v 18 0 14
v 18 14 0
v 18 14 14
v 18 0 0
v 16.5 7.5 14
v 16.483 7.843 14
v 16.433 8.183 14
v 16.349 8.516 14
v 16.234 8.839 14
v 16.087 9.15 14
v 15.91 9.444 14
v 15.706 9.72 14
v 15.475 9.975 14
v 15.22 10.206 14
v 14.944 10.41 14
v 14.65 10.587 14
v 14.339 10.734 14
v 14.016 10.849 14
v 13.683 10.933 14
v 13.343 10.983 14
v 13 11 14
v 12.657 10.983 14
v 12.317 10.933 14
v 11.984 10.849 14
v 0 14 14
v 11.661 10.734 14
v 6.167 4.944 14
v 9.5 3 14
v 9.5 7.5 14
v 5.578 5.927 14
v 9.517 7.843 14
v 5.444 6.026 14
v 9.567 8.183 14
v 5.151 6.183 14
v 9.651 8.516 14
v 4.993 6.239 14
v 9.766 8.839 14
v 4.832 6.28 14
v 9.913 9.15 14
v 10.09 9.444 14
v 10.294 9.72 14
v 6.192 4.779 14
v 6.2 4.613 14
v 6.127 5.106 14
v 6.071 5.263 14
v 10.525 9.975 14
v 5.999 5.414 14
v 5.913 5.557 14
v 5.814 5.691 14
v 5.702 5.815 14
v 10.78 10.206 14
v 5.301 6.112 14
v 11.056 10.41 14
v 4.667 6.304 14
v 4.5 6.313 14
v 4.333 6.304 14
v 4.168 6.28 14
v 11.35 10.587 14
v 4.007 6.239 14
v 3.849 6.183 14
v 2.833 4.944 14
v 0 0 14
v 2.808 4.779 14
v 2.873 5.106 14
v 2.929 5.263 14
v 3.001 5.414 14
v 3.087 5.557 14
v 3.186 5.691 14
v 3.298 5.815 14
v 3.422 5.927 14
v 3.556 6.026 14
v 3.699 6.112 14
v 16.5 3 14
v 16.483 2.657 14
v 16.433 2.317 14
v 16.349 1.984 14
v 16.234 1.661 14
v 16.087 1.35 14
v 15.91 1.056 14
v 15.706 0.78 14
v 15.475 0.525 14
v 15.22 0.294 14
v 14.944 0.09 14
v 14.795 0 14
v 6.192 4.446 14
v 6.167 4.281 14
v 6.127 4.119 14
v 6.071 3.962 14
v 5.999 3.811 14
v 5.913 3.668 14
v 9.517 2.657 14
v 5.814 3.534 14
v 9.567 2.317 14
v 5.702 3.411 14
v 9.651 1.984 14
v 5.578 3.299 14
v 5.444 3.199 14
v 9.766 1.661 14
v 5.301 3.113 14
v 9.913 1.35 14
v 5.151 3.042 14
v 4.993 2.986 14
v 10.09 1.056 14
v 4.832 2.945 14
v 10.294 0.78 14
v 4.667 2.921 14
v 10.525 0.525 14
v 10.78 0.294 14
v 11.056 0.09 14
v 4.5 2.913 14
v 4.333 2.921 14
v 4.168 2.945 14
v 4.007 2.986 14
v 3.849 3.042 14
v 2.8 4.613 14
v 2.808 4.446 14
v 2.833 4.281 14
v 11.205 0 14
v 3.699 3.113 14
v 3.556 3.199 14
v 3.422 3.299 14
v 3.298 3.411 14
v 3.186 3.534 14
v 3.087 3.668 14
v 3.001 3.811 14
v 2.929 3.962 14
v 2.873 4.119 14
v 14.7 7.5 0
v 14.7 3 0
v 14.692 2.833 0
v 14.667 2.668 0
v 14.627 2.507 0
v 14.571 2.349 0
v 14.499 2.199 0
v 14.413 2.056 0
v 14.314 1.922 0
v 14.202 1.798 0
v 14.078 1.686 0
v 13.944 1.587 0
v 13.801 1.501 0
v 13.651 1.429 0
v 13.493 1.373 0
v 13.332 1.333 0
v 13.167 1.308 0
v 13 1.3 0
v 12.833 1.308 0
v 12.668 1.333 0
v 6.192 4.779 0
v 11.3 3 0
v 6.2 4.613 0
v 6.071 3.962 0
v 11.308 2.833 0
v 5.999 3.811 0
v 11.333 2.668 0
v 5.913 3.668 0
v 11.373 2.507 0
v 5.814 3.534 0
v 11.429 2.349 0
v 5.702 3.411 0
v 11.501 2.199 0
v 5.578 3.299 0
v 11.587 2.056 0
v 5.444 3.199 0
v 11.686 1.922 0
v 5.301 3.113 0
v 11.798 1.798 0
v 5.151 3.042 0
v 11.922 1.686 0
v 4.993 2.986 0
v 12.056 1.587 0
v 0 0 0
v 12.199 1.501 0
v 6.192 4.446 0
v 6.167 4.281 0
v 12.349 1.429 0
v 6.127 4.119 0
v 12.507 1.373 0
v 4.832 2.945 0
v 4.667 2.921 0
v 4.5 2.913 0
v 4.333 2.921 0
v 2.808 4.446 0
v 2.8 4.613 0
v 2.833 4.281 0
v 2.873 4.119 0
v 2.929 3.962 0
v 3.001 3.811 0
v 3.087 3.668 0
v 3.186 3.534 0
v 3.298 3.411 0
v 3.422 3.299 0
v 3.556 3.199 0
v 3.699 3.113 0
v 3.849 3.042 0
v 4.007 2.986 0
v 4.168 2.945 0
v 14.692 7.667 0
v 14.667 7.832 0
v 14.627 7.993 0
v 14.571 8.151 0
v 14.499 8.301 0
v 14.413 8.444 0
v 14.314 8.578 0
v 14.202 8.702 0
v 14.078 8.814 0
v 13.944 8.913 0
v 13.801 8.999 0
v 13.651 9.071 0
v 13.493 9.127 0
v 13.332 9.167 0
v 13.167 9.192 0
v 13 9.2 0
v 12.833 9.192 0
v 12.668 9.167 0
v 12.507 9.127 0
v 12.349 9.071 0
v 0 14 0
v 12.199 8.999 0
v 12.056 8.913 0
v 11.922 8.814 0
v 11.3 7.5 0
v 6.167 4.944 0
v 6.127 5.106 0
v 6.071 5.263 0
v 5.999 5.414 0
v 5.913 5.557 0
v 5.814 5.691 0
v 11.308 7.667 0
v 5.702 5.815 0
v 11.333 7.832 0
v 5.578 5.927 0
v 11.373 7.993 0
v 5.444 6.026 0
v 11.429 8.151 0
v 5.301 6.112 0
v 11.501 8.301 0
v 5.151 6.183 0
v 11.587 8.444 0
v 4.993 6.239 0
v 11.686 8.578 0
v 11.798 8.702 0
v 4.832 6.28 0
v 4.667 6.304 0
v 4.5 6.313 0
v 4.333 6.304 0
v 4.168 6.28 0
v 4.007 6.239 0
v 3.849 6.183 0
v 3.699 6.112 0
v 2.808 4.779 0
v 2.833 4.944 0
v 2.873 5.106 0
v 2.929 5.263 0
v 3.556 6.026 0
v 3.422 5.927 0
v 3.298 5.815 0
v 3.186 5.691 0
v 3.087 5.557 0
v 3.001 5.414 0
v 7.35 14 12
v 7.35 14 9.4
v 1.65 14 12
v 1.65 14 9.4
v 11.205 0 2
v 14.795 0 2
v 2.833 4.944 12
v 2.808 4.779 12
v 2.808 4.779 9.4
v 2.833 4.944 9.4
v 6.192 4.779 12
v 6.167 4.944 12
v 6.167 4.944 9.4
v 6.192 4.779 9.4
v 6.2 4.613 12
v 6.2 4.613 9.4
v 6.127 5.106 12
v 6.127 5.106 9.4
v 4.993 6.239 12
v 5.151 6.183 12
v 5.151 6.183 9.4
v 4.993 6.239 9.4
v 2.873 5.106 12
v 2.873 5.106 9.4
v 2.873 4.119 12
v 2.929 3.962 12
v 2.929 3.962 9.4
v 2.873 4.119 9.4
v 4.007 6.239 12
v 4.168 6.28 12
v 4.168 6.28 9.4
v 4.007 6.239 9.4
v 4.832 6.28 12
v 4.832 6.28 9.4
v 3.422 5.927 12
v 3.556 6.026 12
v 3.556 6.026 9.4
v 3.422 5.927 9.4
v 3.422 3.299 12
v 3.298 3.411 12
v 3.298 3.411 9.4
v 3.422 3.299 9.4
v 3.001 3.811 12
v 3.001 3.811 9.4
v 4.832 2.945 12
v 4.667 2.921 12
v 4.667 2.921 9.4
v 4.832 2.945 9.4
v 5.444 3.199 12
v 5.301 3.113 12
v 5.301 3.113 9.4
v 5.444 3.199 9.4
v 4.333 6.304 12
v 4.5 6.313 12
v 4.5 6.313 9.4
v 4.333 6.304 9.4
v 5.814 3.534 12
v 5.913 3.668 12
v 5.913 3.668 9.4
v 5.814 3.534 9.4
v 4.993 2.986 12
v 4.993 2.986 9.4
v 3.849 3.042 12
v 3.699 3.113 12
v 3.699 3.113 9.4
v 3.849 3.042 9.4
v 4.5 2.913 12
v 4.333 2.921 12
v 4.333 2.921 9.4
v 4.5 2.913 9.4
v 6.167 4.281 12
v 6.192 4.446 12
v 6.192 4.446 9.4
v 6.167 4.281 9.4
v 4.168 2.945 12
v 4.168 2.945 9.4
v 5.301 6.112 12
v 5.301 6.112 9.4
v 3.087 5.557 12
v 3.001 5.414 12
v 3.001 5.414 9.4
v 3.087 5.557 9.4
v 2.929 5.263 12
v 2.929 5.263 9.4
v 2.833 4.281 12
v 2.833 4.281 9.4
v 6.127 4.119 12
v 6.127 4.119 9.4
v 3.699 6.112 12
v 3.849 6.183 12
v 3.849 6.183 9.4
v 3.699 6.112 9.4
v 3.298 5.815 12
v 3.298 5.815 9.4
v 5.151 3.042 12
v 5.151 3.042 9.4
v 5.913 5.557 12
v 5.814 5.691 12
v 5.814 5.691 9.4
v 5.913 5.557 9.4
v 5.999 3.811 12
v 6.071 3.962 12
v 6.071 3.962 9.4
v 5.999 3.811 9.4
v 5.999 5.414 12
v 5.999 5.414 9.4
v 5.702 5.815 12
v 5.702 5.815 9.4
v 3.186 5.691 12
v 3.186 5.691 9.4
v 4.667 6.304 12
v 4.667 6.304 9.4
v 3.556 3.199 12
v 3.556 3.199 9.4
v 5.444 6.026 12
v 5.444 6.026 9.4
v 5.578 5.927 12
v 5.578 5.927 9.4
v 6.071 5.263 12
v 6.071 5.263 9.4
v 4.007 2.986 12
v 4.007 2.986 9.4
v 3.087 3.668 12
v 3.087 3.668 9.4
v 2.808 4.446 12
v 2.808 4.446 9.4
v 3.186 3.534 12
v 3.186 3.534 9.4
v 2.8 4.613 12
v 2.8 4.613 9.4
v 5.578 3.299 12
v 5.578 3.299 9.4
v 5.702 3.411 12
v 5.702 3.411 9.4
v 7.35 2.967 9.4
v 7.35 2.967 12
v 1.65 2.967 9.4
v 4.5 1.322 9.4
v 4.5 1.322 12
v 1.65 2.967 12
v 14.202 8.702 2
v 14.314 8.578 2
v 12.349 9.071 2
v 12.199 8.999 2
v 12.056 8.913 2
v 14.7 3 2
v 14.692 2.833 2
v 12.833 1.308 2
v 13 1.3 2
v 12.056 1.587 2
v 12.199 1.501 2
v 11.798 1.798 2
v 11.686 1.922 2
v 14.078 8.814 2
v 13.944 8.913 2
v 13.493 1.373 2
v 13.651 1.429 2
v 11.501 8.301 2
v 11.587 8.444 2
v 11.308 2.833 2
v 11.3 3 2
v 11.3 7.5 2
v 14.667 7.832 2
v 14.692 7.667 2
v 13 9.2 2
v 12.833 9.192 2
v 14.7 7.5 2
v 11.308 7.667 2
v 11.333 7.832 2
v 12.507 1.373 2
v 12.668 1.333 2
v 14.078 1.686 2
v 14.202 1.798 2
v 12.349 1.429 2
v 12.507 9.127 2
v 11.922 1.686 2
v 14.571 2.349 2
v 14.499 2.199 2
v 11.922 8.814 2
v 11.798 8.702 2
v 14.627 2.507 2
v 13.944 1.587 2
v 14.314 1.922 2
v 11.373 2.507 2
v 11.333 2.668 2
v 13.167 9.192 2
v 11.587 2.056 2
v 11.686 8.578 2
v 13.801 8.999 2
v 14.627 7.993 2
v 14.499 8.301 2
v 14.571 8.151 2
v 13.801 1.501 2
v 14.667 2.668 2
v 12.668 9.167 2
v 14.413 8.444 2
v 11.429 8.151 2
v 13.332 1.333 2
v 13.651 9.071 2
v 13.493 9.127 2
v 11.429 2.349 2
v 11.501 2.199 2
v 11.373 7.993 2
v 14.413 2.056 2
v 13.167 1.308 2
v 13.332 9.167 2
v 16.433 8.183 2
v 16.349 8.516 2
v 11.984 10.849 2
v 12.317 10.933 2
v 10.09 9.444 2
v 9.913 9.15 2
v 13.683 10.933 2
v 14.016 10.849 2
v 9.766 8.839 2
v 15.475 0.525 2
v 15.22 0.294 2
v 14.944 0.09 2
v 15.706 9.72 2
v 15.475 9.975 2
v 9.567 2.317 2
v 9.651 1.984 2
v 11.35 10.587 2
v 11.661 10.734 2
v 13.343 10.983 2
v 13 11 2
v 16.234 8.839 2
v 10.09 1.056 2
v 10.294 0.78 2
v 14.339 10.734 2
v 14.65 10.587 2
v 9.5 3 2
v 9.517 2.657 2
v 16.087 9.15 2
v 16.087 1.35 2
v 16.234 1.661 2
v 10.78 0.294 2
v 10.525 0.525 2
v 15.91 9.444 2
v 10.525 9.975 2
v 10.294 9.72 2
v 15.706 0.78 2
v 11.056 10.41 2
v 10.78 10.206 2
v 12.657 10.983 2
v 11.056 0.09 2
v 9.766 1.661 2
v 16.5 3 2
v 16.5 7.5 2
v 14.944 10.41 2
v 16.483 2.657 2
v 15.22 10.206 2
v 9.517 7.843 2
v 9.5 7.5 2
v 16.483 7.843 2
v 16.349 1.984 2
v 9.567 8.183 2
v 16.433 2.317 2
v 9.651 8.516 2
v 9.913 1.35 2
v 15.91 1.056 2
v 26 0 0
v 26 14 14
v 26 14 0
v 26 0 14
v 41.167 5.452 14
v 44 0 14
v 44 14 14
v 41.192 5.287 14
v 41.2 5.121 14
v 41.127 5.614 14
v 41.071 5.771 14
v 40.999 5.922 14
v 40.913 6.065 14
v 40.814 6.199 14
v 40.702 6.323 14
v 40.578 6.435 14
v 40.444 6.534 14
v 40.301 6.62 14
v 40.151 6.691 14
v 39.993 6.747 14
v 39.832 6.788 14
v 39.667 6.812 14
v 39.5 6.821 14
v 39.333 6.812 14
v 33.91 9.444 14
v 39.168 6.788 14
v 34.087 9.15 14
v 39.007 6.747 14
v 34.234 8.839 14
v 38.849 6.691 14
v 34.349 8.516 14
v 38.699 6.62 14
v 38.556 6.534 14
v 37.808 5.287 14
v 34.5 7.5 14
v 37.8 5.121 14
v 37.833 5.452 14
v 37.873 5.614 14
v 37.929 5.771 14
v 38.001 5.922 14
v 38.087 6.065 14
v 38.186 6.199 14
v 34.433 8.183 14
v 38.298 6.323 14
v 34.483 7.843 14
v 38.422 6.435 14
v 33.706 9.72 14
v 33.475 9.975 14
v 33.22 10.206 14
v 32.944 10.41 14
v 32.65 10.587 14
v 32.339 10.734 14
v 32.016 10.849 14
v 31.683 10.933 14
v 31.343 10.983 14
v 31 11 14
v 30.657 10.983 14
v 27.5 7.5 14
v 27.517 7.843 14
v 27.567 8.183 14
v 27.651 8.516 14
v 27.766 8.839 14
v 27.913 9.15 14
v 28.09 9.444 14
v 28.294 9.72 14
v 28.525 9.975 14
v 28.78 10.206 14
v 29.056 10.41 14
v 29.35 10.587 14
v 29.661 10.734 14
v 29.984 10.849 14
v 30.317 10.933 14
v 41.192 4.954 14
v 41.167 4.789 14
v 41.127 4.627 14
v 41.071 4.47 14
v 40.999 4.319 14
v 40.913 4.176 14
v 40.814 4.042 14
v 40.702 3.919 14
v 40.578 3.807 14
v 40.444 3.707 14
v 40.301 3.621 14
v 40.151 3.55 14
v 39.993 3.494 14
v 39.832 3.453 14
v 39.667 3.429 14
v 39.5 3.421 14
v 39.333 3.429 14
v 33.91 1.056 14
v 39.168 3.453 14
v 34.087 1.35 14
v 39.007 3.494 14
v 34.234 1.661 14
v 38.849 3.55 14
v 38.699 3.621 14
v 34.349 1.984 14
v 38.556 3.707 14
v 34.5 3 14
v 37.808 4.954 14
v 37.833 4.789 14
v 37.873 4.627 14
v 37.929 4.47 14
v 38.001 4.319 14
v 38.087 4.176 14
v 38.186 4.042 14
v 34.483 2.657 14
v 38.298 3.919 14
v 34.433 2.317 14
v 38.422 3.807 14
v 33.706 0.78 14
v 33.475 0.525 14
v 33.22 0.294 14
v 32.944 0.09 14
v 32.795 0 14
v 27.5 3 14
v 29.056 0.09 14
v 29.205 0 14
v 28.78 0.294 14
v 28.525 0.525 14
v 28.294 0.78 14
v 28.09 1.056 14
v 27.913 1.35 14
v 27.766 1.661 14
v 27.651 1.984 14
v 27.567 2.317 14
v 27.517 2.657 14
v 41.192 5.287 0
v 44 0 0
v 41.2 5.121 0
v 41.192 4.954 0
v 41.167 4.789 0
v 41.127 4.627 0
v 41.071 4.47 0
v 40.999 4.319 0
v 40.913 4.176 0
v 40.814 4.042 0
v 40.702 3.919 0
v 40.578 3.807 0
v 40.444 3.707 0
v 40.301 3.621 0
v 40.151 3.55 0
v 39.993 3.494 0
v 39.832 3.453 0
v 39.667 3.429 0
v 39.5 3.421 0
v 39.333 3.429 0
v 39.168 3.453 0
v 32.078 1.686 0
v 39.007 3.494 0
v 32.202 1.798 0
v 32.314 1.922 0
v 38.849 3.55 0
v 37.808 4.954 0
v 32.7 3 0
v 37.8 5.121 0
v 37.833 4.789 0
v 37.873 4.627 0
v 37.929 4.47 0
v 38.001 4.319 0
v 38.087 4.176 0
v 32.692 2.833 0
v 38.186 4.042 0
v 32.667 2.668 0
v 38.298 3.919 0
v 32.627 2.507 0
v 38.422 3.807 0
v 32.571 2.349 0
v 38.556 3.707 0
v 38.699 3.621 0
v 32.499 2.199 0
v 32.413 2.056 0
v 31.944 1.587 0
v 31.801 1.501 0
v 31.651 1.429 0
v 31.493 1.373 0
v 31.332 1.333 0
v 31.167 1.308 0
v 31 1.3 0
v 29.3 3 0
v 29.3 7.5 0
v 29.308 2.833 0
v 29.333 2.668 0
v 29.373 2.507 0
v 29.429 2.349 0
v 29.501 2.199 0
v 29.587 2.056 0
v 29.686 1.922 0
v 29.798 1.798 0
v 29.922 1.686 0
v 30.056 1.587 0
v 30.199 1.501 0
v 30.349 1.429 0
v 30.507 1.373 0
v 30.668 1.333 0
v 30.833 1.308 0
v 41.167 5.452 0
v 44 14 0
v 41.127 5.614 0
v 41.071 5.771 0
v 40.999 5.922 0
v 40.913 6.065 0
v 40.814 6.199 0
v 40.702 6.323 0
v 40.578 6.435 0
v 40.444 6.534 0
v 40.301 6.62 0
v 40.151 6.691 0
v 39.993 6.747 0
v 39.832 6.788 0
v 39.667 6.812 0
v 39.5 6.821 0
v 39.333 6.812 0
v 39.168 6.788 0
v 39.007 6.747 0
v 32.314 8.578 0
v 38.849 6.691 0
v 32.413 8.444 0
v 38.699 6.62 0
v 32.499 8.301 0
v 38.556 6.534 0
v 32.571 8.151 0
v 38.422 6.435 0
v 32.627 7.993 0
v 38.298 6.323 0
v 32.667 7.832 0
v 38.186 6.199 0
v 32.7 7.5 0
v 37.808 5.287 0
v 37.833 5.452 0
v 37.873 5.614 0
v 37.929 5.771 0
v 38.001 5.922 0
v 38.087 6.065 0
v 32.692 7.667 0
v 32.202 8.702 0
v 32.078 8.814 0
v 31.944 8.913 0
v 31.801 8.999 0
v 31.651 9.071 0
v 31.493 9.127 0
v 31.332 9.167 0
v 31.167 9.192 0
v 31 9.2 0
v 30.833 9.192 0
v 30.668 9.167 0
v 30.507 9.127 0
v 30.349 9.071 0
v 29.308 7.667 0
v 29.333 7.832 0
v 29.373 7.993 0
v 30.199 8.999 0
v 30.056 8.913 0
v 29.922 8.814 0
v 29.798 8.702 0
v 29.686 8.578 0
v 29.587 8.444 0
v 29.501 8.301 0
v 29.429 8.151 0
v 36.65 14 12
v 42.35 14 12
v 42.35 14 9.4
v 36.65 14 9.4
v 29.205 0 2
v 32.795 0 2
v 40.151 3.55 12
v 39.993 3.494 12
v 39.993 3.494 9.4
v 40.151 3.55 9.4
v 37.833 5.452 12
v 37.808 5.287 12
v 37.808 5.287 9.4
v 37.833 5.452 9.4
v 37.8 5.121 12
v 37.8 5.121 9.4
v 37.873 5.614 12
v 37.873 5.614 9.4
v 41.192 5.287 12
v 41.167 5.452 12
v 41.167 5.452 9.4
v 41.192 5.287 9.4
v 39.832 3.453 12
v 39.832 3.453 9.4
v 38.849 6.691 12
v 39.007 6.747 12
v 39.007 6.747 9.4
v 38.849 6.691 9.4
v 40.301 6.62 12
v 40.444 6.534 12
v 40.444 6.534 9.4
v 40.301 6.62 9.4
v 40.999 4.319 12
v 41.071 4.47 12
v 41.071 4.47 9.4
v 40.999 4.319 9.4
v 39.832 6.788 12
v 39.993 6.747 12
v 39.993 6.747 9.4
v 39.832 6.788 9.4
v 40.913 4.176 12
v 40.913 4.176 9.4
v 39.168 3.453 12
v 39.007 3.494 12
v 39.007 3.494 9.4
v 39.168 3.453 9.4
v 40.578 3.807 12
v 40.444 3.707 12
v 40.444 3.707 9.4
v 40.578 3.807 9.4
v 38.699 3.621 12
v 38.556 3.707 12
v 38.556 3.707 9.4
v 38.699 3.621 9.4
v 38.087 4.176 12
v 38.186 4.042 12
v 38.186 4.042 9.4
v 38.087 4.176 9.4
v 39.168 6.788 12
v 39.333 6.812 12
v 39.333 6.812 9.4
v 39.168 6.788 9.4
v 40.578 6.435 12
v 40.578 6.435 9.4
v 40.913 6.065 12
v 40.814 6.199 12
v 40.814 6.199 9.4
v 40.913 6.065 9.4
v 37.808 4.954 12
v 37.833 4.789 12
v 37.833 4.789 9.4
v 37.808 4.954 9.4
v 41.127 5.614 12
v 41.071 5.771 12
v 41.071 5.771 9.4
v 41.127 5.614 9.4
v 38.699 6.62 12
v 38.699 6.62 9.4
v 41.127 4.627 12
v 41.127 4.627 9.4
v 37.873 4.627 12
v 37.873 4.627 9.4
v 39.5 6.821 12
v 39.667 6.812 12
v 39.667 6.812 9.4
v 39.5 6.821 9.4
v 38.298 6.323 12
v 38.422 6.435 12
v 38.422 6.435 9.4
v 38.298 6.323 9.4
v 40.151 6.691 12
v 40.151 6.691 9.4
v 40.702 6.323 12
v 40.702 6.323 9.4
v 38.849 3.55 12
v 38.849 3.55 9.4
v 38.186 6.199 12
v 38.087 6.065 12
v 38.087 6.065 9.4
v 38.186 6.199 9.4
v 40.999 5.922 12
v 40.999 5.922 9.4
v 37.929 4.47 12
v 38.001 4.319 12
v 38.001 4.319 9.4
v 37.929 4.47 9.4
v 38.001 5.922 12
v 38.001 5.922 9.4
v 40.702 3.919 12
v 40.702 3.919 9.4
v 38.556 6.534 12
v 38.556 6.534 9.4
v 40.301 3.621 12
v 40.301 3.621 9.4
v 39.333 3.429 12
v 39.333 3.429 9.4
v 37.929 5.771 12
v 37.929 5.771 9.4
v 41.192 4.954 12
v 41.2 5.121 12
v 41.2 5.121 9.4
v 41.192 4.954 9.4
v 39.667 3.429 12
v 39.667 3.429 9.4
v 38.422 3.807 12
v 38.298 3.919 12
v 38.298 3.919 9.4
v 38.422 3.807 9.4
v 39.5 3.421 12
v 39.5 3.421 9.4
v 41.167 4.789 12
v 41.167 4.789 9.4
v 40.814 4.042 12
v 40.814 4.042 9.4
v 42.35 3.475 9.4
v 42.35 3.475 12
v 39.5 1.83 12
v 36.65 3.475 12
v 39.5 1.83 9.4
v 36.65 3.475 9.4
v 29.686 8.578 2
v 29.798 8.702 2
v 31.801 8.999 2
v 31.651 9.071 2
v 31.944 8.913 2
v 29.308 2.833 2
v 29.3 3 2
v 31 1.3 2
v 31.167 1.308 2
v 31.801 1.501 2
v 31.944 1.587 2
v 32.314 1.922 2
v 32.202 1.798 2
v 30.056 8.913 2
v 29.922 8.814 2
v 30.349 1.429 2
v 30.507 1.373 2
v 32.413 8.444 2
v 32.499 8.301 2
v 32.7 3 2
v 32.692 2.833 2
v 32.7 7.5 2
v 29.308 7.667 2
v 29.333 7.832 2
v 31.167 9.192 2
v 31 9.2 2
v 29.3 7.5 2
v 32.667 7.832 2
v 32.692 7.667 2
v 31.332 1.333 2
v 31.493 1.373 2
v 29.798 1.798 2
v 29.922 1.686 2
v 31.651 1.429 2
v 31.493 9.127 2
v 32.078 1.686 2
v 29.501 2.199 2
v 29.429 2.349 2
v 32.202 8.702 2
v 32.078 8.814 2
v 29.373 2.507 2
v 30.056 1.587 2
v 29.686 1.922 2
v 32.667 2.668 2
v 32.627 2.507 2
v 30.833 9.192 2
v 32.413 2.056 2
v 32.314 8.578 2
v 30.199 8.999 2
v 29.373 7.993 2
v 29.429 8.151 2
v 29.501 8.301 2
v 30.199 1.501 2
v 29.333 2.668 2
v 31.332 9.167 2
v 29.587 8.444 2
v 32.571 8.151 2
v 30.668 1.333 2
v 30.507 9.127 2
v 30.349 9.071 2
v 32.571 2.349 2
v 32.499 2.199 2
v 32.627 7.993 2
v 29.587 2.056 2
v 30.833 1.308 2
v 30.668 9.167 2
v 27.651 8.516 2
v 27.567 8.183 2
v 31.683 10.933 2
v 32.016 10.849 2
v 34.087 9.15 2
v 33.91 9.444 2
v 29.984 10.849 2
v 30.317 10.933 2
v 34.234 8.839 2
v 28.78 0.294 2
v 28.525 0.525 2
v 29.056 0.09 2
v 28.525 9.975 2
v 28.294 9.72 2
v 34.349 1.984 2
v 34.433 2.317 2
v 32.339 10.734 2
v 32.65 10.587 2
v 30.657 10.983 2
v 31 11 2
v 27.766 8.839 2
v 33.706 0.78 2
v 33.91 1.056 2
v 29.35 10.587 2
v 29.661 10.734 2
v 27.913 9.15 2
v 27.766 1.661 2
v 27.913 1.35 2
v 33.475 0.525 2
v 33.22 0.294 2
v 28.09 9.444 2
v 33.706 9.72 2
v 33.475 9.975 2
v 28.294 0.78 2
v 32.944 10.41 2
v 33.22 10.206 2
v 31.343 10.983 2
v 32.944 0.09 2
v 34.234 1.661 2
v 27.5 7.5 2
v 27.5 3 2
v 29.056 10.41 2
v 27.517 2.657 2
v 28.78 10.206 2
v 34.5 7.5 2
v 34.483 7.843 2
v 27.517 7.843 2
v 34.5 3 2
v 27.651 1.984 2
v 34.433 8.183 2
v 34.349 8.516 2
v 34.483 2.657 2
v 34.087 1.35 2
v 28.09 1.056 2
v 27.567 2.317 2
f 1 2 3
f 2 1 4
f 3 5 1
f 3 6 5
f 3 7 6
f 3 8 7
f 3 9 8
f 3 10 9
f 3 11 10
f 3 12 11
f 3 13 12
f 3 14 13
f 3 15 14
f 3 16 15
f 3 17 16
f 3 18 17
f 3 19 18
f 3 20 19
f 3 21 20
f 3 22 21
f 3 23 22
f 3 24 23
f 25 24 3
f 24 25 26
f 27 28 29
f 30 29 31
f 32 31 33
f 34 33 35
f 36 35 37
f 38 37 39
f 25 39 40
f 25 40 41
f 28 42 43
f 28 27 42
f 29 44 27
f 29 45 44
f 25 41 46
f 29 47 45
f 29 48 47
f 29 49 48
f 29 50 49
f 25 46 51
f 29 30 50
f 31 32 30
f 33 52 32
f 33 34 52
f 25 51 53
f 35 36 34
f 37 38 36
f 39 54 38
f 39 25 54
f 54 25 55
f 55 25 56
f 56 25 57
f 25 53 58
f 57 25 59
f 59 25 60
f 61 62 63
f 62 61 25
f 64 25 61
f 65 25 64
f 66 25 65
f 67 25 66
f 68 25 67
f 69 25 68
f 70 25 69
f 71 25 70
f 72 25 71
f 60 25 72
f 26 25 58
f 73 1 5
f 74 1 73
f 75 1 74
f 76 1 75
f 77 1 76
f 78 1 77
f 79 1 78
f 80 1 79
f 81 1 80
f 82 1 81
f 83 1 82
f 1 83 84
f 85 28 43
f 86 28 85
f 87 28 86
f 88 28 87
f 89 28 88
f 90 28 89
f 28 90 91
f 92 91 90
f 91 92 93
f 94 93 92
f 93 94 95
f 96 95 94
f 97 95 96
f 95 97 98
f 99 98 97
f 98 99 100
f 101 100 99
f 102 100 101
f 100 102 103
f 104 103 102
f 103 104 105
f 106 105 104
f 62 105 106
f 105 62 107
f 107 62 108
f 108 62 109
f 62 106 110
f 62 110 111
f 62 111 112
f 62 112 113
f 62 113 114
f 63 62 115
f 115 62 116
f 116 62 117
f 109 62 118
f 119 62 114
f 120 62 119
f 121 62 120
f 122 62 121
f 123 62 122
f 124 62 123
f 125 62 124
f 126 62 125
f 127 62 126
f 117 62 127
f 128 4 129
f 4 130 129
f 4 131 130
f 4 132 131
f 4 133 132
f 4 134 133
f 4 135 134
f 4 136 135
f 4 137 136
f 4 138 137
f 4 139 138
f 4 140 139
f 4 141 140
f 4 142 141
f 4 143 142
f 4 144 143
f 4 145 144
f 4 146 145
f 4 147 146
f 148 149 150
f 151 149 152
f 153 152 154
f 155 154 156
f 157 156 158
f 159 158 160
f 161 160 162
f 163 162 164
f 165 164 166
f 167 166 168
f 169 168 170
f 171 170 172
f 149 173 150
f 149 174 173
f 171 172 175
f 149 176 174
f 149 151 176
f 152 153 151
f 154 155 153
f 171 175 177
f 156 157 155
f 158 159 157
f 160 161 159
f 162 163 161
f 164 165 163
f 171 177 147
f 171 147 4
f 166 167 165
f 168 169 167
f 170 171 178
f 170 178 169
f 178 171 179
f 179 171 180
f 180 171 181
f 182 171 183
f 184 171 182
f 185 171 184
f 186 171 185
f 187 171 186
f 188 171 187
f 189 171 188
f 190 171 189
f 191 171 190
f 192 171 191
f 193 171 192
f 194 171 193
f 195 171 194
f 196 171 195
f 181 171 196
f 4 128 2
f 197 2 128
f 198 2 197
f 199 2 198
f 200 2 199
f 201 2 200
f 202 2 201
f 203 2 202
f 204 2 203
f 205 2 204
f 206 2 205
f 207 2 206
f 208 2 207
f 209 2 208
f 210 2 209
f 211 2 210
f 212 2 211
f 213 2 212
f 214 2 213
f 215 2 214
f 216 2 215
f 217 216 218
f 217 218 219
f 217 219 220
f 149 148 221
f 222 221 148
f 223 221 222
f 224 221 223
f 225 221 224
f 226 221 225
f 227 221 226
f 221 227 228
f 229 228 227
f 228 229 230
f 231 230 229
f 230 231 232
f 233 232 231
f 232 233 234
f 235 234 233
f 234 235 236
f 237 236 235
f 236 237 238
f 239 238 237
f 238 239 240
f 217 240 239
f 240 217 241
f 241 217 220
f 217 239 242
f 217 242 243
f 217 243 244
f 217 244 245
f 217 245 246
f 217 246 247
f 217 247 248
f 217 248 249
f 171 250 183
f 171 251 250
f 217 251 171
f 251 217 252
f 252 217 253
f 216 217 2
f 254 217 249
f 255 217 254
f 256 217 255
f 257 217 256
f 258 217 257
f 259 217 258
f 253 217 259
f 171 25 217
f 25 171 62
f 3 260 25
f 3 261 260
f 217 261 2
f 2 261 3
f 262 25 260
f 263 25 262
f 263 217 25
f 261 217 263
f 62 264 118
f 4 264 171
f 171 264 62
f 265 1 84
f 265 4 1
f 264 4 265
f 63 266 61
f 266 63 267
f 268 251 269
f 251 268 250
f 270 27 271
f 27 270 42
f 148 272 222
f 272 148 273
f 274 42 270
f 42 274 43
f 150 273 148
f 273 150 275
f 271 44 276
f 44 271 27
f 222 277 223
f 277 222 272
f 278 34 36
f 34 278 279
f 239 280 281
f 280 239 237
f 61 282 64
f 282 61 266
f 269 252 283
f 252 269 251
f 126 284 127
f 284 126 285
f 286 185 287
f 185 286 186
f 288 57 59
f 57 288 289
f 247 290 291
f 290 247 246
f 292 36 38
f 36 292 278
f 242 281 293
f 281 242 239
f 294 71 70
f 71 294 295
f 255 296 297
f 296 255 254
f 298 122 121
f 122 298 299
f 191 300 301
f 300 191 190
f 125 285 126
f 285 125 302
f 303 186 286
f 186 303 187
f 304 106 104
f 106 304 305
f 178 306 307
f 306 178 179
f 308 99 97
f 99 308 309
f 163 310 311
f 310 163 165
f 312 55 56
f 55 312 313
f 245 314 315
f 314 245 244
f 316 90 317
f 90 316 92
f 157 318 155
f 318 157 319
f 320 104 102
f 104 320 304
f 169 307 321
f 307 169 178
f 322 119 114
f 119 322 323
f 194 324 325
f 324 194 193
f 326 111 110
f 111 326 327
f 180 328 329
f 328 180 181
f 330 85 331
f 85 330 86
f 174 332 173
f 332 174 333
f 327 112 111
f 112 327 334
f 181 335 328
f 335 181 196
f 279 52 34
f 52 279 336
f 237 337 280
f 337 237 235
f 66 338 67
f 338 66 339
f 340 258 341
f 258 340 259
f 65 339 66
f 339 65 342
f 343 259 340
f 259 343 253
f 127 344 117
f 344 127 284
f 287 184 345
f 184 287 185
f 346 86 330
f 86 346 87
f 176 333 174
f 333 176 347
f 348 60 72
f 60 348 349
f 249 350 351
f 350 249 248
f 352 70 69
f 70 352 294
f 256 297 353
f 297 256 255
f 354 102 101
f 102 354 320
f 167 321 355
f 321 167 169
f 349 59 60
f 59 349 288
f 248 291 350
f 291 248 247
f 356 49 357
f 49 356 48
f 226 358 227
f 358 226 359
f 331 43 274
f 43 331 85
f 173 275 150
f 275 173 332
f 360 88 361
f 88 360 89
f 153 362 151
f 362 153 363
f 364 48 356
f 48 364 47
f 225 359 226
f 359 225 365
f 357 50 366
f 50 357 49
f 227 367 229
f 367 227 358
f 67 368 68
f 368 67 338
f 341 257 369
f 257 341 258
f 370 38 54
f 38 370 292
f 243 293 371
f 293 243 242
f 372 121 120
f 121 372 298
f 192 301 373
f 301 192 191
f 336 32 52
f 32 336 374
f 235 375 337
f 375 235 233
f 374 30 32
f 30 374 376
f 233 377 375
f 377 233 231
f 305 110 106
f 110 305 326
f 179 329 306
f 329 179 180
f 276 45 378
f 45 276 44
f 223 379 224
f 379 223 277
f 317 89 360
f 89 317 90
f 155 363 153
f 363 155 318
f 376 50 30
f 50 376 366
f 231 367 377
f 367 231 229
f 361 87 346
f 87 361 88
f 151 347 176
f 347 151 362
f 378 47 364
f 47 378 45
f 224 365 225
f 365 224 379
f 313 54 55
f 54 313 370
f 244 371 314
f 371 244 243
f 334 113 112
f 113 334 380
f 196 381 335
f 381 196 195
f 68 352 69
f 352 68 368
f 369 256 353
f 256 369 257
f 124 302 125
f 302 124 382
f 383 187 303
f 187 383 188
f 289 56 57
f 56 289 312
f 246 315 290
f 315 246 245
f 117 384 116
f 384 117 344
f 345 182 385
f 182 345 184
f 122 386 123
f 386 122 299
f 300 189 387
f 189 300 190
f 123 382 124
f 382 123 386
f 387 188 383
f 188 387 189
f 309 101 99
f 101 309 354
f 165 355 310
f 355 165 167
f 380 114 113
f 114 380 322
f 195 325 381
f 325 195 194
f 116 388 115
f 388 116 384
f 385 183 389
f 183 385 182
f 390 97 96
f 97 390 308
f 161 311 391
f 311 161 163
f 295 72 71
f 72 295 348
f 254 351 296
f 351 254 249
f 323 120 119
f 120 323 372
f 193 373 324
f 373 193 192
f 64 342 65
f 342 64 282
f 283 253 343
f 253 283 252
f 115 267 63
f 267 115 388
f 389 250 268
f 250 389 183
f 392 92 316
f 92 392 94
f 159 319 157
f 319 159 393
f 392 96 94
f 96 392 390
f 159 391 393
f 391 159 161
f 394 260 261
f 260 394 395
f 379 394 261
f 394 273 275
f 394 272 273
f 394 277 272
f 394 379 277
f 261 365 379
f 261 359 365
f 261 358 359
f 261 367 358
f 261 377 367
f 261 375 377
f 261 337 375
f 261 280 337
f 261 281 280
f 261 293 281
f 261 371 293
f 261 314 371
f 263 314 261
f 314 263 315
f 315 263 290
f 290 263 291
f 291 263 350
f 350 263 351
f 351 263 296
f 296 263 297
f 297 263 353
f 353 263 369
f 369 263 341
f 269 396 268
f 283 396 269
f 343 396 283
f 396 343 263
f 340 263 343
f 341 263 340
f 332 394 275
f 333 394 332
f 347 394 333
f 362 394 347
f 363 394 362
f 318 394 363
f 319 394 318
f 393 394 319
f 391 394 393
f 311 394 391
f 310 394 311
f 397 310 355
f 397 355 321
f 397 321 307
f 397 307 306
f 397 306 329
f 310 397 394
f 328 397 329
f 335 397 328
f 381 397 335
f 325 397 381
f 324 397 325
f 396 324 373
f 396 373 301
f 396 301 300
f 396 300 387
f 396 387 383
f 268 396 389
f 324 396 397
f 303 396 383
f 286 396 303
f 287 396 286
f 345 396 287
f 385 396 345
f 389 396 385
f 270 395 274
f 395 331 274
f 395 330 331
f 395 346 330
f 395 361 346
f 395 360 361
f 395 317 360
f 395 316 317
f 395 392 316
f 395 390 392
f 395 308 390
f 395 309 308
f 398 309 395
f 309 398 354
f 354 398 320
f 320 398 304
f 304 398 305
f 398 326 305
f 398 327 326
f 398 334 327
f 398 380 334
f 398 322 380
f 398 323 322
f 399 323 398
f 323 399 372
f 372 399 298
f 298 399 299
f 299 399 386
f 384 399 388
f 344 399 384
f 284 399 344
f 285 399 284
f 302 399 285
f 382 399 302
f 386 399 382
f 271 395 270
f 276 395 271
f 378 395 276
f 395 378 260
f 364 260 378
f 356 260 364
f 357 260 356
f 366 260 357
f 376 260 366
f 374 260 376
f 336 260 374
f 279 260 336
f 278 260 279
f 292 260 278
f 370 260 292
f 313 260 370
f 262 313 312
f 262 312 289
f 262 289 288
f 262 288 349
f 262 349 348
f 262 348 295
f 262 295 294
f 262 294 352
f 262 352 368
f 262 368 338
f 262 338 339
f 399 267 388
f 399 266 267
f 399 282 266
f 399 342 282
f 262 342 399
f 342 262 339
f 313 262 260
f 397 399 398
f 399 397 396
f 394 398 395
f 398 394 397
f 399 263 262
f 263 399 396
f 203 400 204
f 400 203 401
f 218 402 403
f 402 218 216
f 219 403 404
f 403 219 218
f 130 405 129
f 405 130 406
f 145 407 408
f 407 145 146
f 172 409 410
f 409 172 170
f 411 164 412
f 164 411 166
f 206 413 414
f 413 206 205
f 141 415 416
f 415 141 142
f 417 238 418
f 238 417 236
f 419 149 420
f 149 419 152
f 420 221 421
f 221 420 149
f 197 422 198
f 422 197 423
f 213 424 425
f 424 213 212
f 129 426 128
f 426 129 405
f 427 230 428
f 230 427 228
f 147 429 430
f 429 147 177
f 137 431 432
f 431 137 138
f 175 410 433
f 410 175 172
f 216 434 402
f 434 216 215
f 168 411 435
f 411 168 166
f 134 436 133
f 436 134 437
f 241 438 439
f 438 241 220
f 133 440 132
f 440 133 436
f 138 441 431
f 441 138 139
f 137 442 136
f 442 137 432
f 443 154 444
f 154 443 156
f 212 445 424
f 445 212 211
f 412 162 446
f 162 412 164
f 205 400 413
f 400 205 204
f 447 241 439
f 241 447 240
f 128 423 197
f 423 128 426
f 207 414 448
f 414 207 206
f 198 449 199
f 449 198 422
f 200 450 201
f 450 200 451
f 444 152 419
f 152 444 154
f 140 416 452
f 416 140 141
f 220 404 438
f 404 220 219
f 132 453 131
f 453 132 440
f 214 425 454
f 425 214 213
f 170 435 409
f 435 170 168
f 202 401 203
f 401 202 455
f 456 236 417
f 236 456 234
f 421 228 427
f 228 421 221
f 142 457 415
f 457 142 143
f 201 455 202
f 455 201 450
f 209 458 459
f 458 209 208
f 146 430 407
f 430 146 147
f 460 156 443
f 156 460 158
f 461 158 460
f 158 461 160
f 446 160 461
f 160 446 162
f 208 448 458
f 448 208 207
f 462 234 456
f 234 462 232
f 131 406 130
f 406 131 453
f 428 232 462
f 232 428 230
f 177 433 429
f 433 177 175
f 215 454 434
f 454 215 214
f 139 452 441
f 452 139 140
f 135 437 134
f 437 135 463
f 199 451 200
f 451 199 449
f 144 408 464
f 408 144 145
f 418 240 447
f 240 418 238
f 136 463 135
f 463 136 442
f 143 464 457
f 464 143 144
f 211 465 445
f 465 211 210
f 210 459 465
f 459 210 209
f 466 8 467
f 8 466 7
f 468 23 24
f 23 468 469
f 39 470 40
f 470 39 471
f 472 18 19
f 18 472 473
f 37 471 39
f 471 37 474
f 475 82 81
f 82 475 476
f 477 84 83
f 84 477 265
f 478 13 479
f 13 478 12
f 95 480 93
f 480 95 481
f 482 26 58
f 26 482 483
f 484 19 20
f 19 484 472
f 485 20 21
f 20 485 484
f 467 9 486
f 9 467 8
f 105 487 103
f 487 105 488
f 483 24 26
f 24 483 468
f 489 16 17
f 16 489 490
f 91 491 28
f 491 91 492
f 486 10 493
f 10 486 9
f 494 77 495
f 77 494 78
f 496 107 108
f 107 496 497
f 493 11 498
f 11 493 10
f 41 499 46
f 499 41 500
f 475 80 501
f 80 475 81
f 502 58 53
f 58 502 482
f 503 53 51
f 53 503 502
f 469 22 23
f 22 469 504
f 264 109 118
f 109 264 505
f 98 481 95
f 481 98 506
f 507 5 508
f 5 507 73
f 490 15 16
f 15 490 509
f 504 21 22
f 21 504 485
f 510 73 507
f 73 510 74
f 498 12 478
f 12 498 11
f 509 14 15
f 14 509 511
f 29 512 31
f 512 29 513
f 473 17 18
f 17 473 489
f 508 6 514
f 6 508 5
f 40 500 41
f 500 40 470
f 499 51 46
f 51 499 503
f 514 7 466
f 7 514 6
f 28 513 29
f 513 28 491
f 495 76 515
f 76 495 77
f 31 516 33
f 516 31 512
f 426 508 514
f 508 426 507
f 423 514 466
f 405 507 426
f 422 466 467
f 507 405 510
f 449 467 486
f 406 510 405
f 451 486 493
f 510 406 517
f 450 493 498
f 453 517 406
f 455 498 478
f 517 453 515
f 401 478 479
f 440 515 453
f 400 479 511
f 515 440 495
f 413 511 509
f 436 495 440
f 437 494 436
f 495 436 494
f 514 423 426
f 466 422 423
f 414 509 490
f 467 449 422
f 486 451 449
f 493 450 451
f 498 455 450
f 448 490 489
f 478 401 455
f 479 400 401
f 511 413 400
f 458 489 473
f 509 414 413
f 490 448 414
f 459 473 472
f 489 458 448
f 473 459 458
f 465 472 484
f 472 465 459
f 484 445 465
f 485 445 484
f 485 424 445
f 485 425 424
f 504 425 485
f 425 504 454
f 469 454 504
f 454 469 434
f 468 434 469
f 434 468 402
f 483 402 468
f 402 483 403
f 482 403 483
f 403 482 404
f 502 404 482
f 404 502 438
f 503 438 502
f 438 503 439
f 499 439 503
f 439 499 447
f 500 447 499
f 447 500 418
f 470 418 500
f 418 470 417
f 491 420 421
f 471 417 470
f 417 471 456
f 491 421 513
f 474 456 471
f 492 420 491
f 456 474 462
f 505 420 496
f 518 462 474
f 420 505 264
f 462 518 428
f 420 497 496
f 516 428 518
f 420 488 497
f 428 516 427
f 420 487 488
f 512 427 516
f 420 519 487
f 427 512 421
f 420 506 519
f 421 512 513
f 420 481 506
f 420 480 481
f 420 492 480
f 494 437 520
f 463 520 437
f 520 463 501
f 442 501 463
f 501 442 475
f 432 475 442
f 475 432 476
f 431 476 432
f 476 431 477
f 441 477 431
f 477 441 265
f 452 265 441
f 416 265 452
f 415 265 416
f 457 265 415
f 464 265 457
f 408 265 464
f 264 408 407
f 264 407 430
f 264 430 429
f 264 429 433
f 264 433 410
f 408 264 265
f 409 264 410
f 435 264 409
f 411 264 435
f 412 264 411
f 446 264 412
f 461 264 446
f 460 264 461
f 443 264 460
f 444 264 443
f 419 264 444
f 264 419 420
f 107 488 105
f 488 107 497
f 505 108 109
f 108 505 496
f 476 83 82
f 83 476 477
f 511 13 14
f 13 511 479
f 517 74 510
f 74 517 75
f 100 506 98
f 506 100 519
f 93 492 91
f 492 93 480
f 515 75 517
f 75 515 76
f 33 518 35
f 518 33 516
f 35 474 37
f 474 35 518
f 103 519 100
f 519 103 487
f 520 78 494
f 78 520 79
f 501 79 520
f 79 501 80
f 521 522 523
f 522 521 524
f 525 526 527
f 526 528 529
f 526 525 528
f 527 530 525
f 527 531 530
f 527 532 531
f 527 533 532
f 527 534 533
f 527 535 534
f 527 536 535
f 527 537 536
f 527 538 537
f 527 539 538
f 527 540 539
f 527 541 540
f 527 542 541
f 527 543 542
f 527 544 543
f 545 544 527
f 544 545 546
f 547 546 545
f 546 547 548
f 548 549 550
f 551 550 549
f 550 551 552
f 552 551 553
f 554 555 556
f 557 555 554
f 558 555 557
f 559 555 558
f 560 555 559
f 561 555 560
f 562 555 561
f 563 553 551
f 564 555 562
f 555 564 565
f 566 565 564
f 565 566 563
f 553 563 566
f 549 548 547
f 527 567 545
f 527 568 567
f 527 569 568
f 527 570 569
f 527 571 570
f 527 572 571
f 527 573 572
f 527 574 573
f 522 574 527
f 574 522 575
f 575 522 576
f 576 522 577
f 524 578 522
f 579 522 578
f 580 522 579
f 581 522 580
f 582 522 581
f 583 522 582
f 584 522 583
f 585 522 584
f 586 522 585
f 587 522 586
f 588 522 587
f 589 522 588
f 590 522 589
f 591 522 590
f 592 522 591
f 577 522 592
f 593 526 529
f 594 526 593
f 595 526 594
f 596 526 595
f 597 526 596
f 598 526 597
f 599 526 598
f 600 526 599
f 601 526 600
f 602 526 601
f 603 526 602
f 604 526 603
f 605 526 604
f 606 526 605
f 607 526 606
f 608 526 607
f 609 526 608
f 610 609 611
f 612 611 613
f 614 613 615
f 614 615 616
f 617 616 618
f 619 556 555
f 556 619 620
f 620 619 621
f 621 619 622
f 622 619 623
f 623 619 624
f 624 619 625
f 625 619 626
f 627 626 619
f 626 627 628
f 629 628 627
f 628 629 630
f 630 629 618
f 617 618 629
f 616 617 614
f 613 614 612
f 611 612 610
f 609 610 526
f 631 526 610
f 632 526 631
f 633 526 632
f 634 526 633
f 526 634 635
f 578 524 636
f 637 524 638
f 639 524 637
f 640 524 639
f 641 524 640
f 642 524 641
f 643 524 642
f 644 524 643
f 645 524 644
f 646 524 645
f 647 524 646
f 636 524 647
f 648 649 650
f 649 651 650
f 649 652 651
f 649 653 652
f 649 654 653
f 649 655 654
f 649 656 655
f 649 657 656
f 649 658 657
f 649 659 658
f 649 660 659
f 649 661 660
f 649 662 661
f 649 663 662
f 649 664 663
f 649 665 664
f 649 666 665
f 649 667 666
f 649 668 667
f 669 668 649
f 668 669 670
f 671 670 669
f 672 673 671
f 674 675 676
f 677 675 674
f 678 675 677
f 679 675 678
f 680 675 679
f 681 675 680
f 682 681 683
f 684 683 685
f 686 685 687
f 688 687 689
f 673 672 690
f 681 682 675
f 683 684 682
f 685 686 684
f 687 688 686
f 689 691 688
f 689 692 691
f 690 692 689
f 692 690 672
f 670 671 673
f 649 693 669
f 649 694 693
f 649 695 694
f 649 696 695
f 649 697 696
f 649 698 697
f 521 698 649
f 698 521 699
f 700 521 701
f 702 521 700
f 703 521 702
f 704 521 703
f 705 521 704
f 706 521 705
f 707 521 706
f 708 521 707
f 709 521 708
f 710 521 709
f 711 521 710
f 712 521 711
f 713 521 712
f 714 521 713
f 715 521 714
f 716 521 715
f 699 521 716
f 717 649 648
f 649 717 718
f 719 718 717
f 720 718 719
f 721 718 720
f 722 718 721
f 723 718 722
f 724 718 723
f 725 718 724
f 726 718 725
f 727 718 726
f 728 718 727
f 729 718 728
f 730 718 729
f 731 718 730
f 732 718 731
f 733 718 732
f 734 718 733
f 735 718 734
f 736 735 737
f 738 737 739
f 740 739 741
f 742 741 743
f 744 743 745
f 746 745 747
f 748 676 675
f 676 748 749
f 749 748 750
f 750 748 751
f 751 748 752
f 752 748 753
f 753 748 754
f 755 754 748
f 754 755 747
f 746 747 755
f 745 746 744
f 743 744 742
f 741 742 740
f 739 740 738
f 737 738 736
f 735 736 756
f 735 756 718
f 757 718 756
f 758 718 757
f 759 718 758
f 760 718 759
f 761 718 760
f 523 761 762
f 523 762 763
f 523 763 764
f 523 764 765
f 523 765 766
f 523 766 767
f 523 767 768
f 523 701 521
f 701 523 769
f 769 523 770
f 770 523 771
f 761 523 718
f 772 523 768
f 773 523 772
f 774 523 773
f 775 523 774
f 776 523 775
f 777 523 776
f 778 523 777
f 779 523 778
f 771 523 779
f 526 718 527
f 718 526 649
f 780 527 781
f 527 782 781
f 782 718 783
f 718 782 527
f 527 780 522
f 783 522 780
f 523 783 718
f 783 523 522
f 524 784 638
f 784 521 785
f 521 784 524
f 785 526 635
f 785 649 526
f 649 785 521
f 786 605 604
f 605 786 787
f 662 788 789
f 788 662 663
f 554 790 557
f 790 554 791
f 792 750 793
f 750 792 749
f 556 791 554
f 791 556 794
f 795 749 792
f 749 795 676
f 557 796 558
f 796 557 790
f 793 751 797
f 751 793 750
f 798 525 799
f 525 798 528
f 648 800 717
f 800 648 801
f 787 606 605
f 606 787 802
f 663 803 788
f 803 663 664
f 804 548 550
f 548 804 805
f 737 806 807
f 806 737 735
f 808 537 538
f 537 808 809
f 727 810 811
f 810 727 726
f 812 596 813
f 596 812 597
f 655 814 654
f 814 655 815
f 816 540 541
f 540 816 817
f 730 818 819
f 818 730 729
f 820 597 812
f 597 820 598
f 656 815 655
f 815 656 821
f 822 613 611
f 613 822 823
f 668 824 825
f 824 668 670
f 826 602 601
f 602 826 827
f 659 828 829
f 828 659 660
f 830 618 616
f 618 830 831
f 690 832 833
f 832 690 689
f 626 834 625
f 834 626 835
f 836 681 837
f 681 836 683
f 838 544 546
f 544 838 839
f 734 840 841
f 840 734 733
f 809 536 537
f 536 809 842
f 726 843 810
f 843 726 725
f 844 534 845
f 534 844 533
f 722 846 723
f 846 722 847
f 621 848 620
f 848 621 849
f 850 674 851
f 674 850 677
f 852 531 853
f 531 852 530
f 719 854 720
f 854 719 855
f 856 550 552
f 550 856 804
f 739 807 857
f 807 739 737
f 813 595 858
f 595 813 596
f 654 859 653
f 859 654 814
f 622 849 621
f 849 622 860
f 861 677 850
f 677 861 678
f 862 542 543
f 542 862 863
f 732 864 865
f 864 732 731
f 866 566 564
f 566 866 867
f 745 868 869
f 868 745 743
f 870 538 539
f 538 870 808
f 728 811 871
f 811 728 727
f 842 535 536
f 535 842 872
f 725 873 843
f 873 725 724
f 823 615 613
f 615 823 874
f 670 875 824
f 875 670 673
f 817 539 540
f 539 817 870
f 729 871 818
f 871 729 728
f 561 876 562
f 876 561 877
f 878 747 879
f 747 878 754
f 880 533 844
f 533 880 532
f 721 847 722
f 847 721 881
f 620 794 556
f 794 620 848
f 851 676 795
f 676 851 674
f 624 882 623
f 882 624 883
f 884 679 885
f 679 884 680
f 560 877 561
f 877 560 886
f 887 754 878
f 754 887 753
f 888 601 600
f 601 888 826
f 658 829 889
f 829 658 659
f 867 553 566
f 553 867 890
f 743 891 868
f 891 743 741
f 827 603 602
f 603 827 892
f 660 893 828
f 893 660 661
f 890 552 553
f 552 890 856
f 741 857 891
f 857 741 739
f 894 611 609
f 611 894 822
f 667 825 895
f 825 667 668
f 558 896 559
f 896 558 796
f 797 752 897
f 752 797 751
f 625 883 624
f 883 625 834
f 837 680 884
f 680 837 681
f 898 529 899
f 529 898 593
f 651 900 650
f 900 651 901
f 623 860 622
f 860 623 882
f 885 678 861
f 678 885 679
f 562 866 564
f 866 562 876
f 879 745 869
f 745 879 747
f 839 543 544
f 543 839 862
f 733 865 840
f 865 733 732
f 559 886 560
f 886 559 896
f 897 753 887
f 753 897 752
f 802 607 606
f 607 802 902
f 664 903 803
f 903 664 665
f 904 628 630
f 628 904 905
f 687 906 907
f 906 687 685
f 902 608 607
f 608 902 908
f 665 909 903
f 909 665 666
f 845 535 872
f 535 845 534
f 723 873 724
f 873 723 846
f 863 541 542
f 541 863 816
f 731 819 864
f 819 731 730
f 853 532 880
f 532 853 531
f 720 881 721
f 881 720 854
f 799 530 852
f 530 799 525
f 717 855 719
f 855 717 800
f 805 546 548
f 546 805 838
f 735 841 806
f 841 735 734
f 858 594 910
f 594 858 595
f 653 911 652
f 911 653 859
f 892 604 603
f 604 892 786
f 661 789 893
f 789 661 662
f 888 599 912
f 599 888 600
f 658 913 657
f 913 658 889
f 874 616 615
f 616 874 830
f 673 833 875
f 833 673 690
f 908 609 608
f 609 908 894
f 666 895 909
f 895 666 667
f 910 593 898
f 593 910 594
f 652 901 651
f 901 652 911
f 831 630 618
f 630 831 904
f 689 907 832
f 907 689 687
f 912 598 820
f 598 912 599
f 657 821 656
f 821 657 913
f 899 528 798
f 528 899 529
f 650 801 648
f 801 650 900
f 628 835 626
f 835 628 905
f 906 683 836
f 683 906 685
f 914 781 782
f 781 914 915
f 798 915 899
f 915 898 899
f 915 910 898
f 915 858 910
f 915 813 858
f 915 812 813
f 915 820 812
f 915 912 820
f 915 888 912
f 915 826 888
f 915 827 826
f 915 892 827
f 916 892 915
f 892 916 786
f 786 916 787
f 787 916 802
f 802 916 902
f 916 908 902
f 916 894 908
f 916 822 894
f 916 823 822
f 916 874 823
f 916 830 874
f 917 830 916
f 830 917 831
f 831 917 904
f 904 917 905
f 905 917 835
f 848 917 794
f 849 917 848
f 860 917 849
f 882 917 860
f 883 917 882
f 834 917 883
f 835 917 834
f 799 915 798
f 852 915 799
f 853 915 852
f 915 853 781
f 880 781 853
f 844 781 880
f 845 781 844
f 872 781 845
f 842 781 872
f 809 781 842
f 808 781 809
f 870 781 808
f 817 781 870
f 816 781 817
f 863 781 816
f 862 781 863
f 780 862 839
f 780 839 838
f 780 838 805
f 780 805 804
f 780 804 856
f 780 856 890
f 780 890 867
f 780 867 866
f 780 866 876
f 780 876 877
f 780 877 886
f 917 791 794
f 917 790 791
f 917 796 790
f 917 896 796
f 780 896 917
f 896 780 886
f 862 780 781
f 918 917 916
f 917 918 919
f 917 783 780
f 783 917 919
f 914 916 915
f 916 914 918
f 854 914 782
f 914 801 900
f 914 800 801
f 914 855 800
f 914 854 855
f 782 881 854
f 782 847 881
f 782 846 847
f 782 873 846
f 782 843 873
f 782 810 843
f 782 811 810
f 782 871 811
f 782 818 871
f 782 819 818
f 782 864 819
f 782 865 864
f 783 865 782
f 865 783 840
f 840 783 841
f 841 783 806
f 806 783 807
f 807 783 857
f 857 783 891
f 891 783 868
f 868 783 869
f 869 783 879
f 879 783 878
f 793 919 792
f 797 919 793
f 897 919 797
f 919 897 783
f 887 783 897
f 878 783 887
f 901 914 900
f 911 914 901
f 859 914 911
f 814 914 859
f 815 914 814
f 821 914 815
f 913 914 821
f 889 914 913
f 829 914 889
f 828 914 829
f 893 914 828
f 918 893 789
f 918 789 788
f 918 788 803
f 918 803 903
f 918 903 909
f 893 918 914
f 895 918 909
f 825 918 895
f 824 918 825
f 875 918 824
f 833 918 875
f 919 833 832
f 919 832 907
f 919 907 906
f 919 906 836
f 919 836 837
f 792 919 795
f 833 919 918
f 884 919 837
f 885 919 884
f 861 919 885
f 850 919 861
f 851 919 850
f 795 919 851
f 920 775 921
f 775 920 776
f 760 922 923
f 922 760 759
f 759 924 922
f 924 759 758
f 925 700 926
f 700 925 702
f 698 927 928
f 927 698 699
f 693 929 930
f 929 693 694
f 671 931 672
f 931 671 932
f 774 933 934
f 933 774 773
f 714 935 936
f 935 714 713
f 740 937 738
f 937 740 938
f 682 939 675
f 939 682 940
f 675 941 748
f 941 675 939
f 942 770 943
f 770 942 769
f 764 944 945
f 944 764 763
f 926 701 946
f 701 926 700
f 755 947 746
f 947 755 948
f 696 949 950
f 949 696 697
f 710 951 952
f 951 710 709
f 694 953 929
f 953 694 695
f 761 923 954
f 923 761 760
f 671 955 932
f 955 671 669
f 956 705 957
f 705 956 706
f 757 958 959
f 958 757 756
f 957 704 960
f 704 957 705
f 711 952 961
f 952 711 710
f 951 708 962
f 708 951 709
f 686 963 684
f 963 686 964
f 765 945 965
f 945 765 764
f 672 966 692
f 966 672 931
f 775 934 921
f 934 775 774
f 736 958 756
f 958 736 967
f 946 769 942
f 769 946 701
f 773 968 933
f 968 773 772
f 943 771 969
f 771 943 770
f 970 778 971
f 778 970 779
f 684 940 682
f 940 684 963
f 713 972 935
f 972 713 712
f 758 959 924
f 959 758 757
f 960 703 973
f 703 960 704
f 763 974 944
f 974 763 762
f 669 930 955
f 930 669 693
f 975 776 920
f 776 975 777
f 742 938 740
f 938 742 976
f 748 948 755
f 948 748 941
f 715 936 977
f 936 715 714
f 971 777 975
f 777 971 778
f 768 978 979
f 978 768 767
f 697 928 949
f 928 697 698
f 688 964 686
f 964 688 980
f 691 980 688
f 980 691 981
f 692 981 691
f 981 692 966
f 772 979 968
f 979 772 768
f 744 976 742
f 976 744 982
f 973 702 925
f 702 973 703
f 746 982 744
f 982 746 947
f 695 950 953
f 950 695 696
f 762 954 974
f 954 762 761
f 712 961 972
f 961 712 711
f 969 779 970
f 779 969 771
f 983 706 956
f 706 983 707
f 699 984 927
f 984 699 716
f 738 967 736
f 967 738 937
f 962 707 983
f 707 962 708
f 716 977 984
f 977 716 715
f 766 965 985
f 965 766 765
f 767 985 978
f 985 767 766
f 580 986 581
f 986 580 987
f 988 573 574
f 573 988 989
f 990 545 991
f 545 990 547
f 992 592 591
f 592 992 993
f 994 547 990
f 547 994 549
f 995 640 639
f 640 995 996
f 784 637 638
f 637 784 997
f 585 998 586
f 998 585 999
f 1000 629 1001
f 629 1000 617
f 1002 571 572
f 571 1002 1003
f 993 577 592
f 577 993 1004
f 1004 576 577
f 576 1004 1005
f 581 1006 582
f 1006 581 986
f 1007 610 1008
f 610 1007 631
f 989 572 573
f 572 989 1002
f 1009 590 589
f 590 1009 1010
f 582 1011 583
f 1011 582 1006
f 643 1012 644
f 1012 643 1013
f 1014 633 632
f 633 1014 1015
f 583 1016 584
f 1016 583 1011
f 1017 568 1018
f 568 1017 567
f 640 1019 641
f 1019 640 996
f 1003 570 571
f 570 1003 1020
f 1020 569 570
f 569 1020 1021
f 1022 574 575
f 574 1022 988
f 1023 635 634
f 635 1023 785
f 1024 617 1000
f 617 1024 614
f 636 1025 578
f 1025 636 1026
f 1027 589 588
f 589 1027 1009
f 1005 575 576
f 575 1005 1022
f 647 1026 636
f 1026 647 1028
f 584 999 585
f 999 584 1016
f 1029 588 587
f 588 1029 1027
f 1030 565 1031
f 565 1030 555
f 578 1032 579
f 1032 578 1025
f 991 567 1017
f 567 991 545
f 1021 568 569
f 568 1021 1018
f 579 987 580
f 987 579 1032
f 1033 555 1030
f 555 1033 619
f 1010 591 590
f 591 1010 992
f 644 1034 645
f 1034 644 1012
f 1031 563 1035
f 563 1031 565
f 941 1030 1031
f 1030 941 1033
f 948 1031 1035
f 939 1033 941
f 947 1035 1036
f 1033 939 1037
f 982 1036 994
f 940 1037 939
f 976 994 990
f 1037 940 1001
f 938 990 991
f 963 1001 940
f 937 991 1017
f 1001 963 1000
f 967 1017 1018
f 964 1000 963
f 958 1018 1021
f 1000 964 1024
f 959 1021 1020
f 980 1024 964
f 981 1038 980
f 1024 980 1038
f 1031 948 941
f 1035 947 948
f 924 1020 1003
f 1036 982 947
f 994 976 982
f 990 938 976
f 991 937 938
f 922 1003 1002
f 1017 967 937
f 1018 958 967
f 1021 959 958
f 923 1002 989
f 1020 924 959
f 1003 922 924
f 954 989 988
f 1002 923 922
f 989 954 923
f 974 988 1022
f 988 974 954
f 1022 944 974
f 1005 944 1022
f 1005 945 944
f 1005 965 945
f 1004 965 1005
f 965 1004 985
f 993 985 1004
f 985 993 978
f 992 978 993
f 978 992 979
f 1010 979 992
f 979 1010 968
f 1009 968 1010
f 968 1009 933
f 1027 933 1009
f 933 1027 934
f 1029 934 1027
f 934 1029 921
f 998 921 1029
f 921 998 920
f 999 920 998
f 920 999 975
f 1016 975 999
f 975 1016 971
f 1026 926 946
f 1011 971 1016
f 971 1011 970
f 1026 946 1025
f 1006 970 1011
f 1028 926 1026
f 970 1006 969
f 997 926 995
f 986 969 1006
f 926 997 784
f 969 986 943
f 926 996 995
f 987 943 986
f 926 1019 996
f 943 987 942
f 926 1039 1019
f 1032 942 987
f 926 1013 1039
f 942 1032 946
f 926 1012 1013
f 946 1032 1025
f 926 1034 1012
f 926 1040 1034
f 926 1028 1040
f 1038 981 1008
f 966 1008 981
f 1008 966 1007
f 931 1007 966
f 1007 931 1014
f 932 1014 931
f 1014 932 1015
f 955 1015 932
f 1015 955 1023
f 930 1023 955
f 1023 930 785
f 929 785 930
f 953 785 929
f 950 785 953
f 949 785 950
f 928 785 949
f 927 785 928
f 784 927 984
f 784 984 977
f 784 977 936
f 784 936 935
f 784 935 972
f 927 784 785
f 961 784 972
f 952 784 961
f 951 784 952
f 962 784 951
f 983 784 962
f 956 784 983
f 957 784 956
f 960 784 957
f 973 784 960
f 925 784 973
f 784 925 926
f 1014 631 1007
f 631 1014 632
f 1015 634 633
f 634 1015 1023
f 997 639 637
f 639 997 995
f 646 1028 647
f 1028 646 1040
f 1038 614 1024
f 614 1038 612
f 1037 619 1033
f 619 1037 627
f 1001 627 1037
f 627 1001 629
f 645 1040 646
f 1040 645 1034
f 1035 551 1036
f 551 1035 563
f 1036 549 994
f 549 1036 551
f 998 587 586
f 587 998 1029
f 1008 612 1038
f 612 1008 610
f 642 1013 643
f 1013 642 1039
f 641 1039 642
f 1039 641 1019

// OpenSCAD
// Amiga Zorro LAN IDE CP XT Ethernet bezel adaptor v0.2: 14 mm height test fitted, millimetres.
// PCB above blocks; connector and components below PCB.
// Each block: PCB bolt into side-loaded captive nut; bracket bolt
// through recessed well and lower slot into existing threaded metal lug.
height=14; // Height confirmed by user print test.
part="pair"; // left, right, pair
$fn=64;
block_width=18;
block_depth=14;
pcb_x=4.5;
tab_x=13;
tab_y=5;
travel=4; // Original travel
channel_extension=0.5; // Extend CLOSED end only, along +Y
nut_af=5.7;
nut_thickness=2.6;
roof=2;
module slot(d,z,h){
 translate([tab_x,tab_y,z]) hull(){
  translate([0,-travel/2,0]) cylinder(d=d,h=h);
  translate([0,travel/2+channel_extension,0]) cylinder(d=d,h=h);
 }
}
module block(pcb_y){
 difference(){
  cube([block_width,block_depth,height]);
  // Upper PCB fixing, M3 clearance.
  translate([pcb_x,pcb_y,-0.1]) cylinder(d=3.4,h=height+.2);
  // Side-loading nut channel, opening towards interior of case.
  translate([pcb_x,pcb_y,height-roof-nut_thickness])
   rotate([0,0,30]) cylinder(d=nut_af/cos(30),h=nut_thickness,$fn=6);
  translate([pcb_x-nut_af/2,pcb_y,height-roof-nut_thickness])
   cube([nut_af,block_depth, nut_thickness]);
  // Lower bracket fixing: 2 mm floor, recessed M3 head access.
  slot(3.4,-.1,height+.2);
  slot(7,2,height);
 }
}
// Same selected mounting hole index on each side; Gerber setback differs.
if(part=="left") block(4.61262);
if(part=="right") mirror([1,0,0]) block(5.12062);
if(part=="pair"){
 block(4.61262);
 translate([44,0,0]) mirror([1,0,0]) block(5.12062);
}
